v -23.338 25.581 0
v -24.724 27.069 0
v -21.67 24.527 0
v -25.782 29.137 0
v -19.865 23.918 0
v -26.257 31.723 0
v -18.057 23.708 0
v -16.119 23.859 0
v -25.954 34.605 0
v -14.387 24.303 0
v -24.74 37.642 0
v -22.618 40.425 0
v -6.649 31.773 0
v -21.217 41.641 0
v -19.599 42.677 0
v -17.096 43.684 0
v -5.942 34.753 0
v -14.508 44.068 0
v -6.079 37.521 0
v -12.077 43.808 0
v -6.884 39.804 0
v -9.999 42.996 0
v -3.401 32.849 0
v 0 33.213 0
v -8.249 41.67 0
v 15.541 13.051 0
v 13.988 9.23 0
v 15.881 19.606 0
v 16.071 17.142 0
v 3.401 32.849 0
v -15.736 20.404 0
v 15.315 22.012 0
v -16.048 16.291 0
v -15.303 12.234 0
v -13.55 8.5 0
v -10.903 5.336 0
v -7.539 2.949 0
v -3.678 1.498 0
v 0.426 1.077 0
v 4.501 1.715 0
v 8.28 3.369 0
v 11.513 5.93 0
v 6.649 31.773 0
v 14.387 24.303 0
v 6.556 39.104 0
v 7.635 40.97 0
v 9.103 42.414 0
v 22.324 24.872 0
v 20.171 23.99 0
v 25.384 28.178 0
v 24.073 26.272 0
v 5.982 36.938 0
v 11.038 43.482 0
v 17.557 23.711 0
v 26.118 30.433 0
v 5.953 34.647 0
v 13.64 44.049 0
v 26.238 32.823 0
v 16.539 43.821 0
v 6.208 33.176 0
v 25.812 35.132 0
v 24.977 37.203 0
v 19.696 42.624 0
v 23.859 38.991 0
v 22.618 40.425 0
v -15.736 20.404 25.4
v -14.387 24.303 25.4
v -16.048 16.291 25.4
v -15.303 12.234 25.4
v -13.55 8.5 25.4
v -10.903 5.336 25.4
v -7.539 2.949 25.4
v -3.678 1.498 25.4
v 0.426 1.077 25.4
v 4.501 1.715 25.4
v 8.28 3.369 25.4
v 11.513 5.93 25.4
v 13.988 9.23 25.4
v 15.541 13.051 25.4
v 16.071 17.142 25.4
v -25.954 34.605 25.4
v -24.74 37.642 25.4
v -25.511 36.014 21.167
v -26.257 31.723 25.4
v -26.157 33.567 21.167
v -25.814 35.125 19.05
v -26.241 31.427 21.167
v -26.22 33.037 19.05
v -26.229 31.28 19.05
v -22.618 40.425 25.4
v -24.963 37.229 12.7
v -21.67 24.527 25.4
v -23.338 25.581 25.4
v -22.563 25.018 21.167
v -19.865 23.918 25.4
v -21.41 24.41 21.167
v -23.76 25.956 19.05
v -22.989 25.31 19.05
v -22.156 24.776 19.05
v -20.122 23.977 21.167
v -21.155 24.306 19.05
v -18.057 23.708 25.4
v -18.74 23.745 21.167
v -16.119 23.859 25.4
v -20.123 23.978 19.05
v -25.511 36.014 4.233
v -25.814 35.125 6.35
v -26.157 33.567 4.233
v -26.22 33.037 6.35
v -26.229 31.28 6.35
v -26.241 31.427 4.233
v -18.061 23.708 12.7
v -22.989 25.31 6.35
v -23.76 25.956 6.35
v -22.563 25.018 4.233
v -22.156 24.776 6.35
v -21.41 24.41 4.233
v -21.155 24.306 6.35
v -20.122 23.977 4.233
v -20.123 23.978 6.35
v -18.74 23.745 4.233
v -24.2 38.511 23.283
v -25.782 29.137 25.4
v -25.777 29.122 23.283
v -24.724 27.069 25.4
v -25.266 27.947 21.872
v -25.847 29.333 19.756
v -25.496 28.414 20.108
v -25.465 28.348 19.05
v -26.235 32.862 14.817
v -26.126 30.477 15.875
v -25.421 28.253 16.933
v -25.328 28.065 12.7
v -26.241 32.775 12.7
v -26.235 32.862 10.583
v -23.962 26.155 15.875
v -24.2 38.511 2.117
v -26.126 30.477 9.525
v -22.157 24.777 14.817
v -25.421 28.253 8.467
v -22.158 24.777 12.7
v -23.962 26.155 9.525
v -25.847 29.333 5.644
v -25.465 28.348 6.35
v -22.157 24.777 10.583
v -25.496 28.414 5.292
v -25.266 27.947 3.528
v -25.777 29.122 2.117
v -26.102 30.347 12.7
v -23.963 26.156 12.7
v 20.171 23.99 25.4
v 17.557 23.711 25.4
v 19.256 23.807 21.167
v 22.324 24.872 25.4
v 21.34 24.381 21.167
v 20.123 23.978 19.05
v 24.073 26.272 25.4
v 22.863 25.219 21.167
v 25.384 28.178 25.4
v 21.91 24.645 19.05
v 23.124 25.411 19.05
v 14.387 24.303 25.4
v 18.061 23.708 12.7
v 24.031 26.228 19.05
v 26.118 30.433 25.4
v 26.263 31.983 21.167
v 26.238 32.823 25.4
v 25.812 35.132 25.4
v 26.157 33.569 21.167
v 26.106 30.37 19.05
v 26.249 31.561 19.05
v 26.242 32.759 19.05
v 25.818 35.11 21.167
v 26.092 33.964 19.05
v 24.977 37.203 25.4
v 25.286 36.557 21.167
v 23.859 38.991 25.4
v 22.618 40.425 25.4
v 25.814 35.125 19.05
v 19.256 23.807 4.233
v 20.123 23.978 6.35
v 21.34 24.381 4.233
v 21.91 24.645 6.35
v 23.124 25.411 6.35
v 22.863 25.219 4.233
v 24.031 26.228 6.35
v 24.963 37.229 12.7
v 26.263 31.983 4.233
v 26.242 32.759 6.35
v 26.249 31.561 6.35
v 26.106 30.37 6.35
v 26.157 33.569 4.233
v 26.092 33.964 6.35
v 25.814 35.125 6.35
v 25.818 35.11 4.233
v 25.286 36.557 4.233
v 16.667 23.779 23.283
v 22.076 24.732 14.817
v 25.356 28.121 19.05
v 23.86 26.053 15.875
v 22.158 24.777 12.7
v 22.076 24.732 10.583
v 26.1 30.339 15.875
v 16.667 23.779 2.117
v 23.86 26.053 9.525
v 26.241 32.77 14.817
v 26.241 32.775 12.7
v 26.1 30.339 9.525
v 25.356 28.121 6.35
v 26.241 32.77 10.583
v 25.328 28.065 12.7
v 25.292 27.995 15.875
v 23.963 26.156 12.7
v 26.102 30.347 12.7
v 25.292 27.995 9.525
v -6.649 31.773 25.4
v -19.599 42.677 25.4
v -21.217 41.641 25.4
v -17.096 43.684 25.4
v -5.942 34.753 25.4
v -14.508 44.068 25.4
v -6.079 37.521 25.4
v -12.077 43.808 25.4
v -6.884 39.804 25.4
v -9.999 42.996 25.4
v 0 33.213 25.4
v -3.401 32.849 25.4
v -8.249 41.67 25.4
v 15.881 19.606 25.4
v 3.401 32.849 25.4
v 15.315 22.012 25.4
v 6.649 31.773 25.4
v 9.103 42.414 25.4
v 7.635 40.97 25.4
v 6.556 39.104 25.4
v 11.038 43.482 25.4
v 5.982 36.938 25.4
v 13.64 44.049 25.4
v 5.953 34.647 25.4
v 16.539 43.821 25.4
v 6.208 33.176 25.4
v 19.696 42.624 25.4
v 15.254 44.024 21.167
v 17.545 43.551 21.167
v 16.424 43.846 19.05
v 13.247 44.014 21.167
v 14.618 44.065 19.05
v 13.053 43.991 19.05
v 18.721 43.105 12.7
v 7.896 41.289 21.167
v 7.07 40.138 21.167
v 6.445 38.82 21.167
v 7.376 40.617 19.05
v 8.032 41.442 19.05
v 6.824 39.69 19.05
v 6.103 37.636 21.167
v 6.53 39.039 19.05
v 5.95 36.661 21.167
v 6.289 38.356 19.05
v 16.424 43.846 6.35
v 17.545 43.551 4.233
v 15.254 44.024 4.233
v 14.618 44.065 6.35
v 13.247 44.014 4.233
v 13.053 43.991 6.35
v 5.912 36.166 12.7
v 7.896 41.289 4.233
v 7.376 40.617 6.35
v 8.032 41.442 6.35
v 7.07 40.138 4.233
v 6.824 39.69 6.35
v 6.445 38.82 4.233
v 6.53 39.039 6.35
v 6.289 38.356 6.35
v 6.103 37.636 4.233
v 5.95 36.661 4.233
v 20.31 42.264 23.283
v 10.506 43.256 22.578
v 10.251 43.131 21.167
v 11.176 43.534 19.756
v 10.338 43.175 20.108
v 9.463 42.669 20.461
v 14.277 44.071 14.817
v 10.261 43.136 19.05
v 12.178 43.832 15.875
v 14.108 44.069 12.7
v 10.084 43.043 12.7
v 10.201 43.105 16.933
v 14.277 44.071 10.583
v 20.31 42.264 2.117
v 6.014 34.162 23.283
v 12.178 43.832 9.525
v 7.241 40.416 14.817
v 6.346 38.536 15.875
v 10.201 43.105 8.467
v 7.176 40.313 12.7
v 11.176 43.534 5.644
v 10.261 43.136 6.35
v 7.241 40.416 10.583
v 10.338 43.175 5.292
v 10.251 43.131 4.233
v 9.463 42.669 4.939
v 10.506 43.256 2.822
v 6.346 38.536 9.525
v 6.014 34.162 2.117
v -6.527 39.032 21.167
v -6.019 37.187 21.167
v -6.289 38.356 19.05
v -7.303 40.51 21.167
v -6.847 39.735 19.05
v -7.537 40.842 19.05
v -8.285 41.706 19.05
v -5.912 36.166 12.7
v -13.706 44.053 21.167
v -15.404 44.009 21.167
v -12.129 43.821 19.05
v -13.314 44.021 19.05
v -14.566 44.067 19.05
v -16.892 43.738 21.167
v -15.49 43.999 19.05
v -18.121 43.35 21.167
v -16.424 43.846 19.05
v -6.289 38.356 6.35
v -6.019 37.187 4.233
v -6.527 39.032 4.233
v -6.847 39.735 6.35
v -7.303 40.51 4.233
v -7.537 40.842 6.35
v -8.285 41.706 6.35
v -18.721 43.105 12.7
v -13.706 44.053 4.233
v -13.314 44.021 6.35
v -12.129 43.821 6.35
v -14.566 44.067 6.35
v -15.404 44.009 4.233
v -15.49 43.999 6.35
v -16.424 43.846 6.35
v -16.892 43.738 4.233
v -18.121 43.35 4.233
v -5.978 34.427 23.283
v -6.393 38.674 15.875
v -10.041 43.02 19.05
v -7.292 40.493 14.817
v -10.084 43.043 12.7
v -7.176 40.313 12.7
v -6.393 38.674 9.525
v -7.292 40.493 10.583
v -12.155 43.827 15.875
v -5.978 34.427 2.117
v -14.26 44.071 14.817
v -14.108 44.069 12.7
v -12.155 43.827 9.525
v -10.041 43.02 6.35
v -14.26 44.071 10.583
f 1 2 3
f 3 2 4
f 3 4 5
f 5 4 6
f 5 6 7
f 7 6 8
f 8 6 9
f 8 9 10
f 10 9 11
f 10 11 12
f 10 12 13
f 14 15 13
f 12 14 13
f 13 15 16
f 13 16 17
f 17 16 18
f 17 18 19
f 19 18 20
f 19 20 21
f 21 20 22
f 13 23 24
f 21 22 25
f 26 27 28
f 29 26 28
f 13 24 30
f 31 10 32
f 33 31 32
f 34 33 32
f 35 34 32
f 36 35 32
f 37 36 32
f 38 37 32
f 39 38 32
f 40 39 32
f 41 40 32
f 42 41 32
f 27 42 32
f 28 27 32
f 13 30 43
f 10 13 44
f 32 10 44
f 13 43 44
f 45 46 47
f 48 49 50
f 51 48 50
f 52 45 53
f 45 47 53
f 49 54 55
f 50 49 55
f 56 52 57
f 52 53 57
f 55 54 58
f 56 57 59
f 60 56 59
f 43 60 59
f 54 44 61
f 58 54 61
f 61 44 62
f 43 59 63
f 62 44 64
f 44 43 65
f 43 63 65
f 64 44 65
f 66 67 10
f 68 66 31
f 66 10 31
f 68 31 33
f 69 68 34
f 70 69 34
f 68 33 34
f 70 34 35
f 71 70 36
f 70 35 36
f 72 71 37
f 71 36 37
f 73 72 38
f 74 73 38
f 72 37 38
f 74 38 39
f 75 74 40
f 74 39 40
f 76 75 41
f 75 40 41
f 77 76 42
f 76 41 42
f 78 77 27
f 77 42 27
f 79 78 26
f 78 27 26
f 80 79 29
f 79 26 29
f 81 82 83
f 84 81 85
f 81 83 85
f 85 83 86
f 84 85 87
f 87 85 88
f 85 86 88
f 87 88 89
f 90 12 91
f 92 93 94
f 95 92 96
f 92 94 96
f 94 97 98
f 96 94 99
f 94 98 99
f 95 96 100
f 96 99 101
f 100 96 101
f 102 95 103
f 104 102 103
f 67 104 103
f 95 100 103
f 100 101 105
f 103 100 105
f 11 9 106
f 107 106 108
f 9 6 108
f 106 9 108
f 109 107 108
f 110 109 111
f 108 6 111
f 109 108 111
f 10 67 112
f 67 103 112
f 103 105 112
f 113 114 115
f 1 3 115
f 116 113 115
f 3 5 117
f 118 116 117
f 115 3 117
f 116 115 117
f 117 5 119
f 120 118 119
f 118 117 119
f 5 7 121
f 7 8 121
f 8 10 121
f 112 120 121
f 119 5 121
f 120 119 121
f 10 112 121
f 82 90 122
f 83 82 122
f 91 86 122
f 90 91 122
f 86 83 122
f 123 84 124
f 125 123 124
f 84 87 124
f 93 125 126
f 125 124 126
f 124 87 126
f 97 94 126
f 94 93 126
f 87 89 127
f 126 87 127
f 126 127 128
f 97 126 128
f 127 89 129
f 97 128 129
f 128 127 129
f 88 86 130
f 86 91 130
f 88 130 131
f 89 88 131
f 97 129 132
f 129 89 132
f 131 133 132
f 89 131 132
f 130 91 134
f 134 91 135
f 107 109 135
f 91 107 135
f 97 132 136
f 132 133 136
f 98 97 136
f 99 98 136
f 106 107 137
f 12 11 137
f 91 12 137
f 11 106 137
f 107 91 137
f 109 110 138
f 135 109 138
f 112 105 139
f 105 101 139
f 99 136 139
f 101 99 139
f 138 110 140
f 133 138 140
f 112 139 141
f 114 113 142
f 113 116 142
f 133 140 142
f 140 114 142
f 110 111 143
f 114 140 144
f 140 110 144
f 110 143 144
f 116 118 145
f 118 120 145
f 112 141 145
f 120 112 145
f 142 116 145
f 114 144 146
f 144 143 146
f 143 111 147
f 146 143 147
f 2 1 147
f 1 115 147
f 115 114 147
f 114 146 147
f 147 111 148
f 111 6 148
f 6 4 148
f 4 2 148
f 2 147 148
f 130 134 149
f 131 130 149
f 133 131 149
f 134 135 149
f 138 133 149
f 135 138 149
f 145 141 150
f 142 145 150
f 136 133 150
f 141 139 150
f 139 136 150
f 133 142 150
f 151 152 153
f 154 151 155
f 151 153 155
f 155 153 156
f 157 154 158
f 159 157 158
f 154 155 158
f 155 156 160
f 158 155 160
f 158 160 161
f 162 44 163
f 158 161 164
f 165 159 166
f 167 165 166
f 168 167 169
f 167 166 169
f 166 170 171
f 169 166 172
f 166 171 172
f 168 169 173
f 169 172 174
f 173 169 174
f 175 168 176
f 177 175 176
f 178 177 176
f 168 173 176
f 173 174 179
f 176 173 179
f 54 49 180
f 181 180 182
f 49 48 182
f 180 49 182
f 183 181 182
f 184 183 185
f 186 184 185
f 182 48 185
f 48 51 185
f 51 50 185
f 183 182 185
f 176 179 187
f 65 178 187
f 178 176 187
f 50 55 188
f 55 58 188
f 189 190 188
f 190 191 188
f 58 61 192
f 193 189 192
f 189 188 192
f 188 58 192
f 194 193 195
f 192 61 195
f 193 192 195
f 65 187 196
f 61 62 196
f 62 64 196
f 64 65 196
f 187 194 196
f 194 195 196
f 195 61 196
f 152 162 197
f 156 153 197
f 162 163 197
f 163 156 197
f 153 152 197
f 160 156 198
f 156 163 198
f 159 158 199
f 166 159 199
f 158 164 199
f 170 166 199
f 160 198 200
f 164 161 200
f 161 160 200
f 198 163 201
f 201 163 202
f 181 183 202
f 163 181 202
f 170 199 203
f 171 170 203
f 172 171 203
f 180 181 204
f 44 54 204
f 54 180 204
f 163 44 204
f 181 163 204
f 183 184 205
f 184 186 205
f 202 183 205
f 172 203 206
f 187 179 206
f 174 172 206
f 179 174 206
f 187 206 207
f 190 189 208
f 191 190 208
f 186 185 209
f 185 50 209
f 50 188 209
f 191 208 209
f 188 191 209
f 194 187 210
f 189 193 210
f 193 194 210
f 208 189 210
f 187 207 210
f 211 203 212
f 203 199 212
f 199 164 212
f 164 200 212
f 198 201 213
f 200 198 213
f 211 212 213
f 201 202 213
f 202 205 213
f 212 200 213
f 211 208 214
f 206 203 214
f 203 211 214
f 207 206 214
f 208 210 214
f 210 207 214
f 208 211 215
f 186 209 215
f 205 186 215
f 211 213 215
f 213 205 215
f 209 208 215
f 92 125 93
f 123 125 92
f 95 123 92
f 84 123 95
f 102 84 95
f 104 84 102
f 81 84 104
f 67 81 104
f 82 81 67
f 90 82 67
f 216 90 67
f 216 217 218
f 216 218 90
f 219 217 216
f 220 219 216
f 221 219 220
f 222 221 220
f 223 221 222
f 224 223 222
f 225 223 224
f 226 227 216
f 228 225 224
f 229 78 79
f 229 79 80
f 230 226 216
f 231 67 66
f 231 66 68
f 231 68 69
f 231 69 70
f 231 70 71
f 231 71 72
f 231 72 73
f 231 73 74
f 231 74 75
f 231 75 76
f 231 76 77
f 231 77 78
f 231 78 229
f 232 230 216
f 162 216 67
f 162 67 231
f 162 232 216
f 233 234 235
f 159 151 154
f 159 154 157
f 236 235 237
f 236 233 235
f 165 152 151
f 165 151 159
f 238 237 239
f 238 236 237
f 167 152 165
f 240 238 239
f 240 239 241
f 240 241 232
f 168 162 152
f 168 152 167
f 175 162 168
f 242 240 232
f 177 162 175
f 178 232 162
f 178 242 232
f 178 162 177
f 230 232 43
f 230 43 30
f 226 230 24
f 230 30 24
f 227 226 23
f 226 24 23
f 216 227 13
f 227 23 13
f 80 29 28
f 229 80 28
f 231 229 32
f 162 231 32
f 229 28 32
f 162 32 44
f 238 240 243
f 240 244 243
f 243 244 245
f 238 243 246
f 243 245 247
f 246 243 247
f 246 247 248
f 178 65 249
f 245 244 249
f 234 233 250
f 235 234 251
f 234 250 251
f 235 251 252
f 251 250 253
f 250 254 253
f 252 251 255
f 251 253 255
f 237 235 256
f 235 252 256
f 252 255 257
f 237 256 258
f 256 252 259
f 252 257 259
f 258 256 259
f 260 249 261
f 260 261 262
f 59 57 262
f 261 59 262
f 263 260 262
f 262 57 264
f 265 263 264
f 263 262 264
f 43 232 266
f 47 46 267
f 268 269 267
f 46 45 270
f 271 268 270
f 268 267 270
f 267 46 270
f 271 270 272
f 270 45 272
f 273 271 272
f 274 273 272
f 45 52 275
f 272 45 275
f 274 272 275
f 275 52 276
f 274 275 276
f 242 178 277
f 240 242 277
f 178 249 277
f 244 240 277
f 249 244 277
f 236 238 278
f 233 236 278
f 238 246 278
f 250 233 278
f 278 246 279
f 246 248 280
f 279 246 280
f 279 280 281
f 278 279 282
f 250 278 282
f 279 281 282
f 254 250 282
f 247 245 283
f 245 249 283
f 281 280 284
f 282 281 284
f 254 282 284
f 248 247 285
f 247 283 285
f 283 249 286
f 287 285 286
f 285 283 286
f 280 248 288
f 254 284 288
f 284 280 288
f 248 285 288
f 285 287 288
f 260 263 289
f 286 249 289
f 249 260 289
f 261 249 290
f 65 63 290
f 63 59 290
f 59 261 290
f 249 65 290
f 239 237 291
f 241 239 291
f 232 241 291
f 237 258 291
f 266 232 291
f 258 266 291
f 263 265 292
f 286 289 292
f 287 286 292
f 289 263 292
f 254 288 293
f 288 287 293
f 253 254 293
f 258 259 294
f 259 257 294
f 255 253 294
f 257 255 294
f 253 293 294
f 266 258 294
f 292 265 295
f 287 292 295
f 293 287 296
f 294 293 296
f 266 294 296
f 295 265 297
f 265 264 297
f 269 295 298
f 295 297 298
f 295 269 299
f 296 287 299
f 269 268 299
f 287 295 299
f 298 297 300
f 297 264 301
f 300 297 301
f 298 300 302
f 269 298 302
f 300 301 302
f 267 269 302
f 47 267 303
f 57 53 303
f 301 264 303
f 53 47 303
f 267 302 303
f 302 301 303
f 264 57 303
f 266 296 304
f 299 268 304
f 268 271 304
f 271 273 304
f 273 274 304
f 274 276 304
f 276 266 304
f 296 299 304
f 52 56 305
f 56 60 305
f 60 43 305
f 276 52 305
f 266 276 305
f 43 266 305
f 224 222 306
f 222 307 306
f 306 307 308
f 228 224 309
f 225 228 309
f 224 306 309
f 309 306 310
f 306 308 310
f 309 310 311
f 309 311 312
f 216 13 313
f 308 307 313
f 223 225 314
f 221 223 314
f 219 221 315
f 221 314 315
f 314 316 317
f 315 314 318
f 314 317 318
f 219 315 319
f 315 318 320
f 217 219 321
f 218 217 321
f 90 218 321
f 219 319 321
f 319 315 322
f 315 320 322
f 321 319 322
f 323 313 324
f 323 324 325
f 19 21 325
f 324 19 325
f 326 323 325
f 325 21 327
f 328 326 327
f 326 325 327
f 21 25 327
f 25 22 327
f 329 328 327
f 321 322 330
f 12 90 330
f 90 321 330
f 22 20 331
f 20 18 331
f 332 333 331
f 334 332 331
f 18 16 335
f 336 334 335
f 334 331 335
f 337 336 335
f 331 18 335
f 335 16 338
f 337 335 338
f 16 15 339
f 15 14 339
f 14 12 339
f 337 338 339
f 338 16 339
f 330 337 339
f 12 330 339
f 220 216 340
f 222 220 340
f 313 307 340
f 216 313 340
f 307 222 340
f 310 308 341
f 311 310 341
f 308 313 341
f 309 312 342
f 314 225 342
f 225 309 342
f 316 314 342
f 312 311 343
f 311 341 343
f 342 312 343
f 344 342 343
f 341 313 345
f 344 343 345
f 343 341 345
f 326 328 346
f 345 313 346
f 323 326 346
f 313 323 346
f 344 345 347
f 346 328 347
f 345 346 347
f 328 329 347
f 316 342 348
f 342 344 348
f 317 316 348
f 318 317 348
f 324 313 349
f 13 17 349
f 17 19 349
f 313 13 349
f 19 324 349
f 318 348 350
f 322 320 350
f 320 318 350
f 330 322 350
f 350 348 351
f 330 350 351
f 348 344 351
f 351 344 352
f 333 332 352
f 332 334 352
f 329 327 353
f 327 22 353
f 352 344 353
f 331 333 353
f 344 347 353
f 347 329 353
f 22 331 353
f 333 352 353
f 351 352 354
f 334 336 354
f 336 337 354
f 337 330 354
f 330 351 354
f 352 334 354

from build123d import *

# Parameters (mm, degrees)
F1_DEPTH = 25.4


with BuildPart() as f1:
    # F0 (on Top) → F1 (new body)
    with BuildSketch(Plane.XY):
        with BuildLine():
            ThreePointArc((-14.3874178664, 24.3026331135), (-3.6778055907, 1.497966924), (16.0707555221, 17.1422287822))
            ThreePointArc((16.0707555221, 17.1422287822), (15.6442618582, 20.8200343728), (14.3874178664, 24.3026331135))
            add(Edge.make_bspline(
                [(6.6488676301, 31.7730777763), (8.7871476467, 26.2175508691), (14.3874178664, 24.3026331135)],
                knots=[1.0830446402, 1.0830446402, 1.0830446402, 2.100651681, 2.100651681, 2.100651681], degree=2, weights=[1, 0.8733279769, 1]))
            ThreePointArc((6.6488676301, 31.7730777763), (0, 33.2129843043), (-6.6488676301, 31.7730777763))
            add(Edge.make_bspline(
                [(-14.3874178664, 24.3026331135), (-8.7871476467, 26.2175508691), (-6.6488676301, 31.7730777763)],
                knots=[1.0409409725, 1.0409409725, 1.0409409725, 2.0585480134, 2.0585480134, 2.0585480134], degree=2, weights=[1, 0.8733279769, 1]))
        make_face()
        with BuildLine():
            add(Edge.make_bspline(
                [(6.6488676301, 31.7730777763), (8.7871476467, 26.2175508691), (14.3874178664, 24.3026331135)],
                knots=[1.0830446402, 1.0830446402, 1.0830446402, 2.100651681, 2.100651681, 2.100651681], degree=2, weights=[1, 0.8733279769, 1]))
            ThreePointArc((14.3874178664, 24.3026331135), (11.1616850313, 28.7044937122), (6.6488676301, 31.7730777763))
        make_face()
        with BuildLine():
            ThreePointArc((6.6488676301, 31.7730777763), (11.1616850313, 28.7044937122), (14.3874178664, 24.3026331135))
            add(Edge.make_bspline(
                [(14.3874178664, 24.3026331135), (51.3942103362, 11.6487858527), (22.6181104936, 40.4248756132)],
                knots=[2.100651681, 2.100651681, 2.100651681, 4.7123889804, 4.7123889804, 4.7123889804], degree=2, weights=[1, 0.2618394692, 1]))
            add(Edge.make_bspline(
                [(22.6181104936, 40.4248756132), (16.5155810704, 46.5274028982), (10.0839719096, 43.0428931628), (3.6523627487, 39.5583834273), (6.6488676301, 31.7730777763)],
                knots=[4.7123889804, 4.7123889804, 4.7123889804, 6.0393094639, 6.0393094639, 7.3662299474, 7.3662299474, 7.3662299474], degree=2, weights=[1, 0.7878659738, 1, 0.7878659738, 1]))
        make_face()
        with BuildLine():
            add(Edge.make_bspline(
                [(-22.6181104936, 40.4248756132), (-51.3942103362, 11.6487858527), (-14.3874178664, 24.3026331135)],
                knots=[4.7123889804, 4.7123889804, 4.7123889804, 7.3241262797, 7.3241262797, 7.3241262797], degree=2, weights=[1, 0.2618394692, 1]))
            ThreePointArc((-14.3874178664, 24.3026331135), (-11.1616850313, 28.7044937122), (-6.6488676301, 31.7730777763))
            add(Edge.make_bspline(
                [(-6.6488676301, 31.7730777763), (-3.6523627487, 39.5583834273), (-10.0839719096, 43.0428931628), (-16.5155810704, 46.5274028982), (-22.6181104936, 40.4248756132)],
                knots=[2.0585480134, 2.0585480134, 2.0585480134, 3.3854684969, 3.3854684969, 4.7123889804, 4.7123889804, 4.7123889804], degree=2, weights=[1, 0.7878659738, 1, 0.7878659738, 1]))
        make_face()
        with BuildLine():
            ThreePointArc((-6.6488676301, 31.7730777763), (-11.1616850313, 28.7044937122), (-14.3874178664, 24.3026331135))
            add(Edge.make_bspline(
                [(-14.3874178664, 24.3026331135), (-8.7871476467, 26.2175508691), (-6.6488676301, 31.7730777763)],
                knots=[1.0409409725, 1.0409409725, 1.0409409725, 2.0585480134, 2.0585480134, 2.0585480134], degree=2, weights=[1, 0.8733279769, 1]))
        make_face()
    extrude(amount=F1_DEPTH)


solid = f1.part
